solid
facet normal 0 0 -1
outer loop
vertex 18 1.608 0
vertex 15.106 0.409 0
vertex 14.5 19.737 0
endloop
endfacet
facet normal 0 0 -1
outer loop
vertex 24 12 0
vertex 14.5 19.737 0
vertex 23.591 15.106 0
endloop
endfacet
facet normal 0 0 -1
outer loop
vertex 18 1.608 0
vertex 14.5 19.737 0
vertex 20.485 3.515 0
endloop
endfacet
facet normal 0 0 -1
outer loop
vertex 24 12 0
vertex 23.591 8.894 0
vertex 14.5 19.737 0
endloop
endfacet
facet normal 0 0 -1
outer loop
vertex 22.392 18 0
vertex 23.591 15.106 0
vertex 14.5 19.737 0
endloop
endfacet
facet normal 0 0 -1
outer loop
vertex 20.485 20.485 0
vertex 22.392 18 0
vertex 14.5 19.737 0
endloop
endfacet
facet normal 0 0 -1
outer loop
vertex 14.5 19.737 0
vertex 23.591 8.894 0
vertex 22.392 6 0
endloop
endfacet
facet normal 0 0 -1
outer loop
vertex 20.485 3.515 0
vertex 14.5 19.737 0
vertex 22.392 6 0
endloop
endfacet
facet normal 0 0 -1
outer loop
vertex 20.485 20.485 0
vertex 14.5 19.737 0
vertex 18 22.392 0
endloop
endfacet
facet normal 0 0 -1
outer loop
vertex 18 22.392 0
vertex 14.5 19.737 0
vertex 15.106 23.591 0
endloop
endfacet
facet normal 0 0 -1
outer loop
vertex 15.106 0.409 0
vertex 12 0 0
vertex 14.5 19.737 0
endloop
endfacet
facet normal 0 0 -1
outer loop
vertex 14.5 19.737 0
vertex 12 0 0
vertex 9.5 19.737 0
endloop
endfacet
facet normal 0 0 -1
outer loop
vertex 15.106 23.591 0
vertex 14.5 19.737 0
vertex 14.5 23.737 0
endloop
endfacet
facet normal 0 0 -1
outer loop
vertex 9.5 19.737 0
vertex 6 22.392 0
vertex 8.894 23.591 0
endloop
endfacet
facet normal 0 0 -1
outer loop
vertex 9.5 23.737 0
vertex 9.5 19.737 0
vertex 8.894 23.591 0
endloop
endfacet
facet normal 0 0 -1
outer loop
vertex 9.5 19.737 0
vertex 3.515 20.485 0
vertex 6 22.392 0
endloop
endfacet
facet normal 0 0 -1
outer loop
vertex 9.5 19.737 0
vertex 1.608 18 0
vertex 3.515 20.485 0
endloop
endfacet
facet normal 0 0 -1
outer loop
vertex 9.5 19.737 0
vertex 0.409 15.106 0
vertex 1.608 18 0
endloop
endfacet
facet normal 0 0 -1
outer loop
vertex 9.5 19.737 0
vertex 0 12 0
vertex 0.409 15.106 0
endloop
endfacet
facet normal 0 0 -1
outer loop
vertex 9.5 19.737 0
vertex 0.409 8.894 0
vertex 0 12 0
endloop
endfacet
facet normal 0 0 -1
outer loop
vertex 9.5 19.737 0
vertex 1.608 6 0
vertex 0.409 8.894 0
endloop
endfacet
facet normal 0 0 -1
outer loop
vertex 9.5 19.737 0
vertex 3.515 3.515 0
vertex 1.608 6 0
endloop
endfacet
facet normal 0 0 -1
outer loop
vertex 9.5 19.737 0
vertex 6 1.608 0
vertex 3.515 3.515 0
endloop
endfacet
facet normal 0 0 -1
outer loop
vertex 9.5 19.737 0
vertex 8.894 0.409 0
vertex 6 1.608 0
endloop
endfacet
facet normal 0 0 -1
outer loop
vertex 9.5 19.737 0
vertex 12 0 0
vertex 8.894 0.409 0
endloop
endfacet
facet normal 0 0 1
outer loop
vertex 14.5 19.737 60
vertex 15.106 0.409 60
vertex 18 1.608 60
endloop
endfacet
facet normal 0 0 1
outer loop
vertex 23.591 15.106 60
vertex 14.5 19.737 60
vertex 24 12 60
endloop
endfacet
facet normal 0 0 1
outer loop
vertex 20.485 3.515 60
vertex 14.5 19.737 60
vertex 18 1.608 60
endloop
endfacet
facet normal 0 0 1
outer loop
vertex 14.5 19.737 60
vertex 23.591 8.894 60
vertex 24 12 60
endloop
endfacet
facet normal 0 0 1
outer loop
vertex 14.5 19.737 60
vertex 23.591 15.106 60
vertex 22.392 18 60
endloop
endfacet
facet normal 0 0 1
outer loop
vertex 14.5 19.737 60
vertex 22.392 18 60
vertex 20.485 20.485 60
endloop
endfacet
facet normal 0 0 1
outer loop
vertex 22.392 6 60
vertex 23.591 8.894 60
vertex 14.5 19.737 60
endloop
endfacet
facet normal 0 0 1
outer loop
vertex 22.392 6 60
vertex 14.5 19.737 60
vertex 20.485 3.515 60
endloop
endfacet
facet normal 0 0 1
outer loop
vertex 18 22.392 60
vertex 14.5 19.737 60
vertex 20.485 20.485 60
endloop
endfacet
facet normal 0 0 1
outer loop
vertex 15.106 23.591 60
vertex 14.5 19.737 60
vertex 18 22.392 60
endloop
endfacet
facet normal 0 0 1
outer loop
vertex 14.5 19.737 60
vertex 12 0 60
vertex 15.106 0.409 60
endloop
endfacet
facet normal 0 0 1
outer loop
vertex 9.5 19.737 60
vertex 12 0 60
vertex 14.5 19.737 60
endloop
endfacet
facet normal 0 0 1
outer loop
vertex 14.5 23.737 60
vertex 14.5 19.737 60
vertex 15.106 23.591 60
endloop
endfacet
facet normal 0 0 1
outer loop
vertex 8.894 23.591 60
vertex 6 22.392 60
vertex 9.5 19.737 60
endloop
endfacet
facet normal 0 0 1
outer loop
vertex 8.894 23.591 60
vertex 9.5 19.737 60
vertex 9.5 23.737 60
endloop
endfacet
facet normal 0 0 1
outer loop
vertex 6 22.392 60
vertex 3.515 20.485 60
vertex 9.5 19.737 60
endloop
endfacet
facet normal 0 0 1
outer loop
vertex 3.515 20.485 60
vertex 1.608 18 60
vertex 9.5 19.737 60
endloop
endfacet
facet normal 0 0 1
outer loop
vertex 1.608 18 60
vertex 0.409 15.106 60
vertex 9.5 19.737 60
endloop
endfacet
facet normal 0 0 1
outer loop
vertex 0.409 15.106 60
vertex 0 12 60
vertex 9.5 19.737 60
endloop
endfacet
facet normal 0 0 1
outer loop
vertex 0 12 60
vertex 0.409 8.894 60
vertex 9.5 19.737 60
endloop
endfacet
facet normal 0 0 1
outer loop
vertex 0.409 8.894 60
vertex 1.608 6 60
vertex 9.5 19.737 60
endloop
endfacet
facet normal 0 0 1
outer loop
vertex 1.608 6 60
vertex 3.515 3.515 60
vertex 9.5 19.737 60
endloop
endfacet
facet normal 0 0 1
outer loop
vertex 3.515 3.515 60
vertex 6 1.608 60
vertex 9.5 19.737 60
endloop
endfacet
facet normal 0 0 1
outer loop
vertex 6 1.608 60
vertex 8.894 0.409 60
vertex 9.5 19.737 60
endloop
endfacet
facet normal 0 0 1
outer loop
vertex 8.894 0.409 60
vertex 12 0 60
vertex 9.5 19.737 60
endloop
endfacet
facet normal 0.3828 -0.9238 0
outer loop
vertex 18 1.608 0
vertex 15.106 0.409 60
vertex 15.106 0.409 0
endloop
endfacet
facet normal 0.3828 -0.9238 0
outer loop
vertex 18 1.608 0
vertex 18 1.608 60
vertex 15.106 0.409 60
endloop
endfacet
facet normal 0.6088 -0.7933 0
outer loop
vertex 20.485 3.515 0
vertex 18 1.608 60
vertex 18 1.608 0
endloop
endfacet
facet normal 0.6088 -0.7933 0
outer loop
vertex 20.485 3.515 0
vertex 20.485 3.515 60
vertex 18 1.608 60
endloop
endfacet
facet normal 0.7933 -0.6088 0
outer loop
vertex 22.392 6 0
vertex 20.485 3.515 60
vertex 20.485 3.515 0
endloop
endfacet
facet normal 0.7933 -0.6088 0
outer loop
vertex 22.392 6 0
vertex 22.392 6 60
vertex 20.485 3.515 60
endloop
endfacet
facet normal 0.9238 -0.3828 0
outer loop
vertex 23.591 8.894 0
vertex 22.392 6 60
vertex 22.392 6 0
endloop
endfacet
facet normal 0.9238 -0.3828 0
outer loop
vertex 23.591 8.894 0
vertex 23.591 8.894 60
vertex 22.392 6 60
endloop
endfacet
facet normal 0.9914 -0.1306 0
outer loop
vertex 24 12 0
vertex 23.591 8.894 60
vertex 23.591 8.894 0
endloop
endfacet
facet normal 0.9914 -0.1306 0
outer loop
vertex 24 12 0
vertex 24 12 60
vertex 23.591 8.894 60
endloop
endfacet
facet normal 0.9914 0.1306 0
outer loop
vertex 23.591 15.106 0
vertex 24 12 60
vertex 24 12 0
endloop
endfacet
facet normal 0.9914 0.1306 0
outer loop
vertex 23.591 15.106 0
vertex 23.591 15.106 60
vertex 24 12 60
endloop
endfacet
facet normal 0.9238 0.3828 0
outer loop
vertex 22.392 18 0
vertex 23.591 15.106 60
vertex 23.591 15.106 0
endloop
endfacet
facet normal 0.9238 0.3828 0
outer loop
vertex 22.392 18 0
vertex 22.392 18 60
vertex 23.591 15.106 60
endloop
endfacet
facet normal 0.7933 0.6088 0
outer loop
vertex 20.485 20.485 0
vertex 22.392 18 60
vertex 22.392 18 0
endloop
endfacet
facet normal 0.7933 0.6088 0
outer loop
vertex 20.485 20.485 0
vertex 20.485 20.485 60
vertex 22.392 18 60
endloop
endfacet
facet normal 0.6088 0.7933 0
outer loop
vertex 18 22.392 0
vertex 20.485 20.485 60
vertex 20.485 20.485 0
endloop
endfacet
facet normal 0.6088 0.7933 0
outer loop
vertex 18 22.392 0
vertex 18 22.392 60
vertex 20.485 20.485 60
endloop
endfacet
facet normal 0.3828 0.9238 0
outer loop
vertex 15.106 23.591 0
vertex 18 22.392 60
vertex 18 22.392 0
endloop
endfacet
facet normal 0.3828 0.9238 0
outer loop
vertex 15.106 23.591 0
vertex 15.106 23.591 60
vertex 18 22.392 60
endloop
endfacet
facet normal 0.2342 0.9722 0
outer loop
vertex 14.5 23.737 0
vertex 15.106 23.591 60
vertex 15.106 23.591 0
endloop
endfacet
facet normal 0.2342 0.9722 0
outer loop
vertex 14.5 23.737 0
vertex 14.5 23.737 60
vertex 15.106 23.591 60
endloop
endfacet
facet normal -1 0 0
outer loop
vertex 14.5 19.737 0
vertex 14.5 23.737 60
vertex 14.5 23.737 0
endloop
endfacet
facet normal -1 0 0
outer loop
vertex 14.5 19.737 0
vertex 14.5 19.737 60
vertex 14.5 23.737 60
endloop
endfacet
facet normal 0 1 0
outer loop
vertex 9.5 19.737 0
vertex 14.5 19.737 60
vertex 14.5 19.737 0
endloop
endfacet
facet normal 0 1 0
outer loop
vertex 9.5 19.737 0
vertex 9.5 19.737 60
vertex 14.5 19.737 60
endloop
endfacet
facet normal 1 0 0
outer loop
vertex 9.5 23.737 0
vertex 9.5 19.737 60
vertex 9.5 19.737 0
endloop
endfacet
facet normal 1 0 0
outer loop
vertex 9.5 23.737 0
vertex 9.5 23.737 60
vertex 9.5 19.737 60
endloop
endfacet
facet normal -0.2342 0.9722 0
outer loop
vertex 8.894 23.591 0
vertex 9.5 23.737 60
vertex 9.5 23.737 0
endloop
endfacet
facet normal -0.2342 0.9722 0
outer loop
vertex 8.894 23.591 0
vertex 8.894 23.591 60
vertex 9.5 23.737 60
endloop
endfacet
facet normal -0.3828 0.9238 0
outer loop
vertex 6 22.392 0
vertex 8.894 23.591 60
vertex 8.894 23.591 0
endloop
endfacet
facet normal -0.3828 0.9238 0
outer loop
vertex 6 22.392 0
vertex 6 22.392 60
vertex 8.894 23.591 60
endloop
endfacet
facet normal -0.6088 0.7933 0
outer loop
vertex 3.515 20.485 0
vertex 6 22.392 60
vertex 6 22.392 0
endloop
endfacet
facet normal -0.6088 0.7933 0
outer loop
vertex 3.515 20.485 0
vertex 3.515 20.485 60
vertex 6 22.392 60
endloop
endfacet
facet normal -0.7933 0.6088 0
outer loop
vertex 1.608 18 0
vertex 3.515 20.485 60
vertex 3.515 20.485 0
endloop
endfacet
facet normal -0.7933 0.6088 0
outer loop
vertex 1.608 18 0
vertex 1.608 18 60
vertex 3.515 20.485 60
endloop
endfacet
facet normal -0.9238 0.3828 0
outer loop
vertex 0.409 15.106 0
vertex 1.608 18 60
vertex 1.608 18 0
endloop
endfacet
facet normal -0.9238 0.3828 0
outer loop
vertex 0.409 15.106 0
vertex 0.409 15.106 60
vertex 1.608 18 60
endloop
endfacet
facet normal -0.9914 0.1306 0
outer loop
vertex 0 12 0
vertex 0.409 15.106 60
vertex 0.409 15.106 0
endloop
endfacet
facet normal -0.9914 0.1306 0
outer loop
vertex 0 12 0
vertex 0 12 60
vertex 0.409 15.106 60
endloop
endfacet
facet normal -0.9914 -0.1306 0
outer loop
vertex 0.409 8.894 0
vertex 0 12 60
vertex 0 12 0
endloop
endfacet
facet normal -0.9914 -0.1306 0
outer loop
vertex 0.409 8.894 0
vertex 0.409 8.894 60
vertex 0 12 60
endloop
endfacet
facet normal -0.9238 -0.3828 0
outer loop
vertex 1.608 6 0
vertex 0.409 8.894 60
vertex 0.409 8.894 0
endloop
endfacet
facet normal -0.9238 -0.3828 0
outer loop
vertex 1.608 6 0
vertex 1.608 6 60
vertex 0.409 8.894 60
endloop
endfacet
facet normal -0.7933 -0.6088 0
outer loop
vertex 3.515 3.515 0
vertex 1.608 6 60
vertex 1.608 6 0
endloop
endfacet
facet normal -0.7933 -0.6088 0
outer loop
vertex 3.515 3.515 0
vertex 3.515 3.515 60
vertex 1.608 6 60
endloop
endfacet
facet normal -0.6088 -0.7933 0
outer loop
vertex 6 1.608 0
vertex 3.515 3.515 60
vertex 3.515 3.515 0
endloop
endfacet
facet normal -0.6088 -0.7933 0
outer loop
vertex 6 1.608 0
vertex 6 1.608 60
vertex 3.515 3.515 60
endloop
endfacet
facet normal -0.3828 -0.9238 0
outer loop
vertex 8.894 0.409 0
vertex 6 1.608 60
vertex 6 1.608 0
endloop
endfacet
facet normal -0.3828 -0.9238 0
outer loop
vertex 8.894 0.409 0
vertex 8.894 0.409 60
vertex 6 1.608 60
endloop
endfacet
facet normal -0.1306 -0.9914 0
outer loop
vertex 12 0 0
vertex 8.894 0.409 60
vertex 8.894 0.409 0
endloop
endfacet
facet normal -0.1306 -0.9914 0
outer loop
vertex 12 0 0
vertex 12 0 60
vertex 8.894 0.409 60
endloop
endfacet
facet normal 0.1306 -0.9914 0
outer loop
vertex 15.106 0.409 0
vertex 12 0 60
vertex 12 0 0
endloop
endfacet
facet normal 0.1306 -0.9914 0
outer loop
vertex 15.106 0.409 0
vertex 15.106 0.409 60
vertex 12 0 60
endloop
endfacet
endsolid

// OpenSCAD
$fn = 32;

// ----------------------------------------------------------------------
// Keyway shaft: d24 shaft, key 5 x 4 mm
// ----------------------------------------------------------------------

// --- parameters (mm) ---
shaft_r = 12;             // shaft radius
key_w = 5;                // keyway width
key_d = 4;                // keyway depth below the surface line
plate_t = 60;             // shaft length, Z (extrusion height)

shaft_d = 2 * shaft_r;  // shaft diameter
circle_step = 15;  // polygon sampling step, degrees

profile = [[8.894, 23.591], [6, 22.392], [3.515, 20.485], [1.608, 18], [0.409, 15.106], [0, 12], [0.409, 8.894], [1.608, 6], [3.515, 3.515], [6, 1.608], [8.894, 0.409], [12, 0], [15.106, 0.409], [18, 1.608], [20.485, 3.515], [22.392, 6], [23.591, 8.894], [24, 12], [23.591, 15.106], [22.392, 18], [20.485, 20.485], [18, 22.392], [15.106, 23.591], [14.5, 23.737], [14.5, 19.737], [9.5, 19.737], [9.5, 23.737]];  // primary outline, 27 points, counter clockwise

// --- the one profile operation ---
linear_extrude(height = plate_t) polygon(points = profile);
